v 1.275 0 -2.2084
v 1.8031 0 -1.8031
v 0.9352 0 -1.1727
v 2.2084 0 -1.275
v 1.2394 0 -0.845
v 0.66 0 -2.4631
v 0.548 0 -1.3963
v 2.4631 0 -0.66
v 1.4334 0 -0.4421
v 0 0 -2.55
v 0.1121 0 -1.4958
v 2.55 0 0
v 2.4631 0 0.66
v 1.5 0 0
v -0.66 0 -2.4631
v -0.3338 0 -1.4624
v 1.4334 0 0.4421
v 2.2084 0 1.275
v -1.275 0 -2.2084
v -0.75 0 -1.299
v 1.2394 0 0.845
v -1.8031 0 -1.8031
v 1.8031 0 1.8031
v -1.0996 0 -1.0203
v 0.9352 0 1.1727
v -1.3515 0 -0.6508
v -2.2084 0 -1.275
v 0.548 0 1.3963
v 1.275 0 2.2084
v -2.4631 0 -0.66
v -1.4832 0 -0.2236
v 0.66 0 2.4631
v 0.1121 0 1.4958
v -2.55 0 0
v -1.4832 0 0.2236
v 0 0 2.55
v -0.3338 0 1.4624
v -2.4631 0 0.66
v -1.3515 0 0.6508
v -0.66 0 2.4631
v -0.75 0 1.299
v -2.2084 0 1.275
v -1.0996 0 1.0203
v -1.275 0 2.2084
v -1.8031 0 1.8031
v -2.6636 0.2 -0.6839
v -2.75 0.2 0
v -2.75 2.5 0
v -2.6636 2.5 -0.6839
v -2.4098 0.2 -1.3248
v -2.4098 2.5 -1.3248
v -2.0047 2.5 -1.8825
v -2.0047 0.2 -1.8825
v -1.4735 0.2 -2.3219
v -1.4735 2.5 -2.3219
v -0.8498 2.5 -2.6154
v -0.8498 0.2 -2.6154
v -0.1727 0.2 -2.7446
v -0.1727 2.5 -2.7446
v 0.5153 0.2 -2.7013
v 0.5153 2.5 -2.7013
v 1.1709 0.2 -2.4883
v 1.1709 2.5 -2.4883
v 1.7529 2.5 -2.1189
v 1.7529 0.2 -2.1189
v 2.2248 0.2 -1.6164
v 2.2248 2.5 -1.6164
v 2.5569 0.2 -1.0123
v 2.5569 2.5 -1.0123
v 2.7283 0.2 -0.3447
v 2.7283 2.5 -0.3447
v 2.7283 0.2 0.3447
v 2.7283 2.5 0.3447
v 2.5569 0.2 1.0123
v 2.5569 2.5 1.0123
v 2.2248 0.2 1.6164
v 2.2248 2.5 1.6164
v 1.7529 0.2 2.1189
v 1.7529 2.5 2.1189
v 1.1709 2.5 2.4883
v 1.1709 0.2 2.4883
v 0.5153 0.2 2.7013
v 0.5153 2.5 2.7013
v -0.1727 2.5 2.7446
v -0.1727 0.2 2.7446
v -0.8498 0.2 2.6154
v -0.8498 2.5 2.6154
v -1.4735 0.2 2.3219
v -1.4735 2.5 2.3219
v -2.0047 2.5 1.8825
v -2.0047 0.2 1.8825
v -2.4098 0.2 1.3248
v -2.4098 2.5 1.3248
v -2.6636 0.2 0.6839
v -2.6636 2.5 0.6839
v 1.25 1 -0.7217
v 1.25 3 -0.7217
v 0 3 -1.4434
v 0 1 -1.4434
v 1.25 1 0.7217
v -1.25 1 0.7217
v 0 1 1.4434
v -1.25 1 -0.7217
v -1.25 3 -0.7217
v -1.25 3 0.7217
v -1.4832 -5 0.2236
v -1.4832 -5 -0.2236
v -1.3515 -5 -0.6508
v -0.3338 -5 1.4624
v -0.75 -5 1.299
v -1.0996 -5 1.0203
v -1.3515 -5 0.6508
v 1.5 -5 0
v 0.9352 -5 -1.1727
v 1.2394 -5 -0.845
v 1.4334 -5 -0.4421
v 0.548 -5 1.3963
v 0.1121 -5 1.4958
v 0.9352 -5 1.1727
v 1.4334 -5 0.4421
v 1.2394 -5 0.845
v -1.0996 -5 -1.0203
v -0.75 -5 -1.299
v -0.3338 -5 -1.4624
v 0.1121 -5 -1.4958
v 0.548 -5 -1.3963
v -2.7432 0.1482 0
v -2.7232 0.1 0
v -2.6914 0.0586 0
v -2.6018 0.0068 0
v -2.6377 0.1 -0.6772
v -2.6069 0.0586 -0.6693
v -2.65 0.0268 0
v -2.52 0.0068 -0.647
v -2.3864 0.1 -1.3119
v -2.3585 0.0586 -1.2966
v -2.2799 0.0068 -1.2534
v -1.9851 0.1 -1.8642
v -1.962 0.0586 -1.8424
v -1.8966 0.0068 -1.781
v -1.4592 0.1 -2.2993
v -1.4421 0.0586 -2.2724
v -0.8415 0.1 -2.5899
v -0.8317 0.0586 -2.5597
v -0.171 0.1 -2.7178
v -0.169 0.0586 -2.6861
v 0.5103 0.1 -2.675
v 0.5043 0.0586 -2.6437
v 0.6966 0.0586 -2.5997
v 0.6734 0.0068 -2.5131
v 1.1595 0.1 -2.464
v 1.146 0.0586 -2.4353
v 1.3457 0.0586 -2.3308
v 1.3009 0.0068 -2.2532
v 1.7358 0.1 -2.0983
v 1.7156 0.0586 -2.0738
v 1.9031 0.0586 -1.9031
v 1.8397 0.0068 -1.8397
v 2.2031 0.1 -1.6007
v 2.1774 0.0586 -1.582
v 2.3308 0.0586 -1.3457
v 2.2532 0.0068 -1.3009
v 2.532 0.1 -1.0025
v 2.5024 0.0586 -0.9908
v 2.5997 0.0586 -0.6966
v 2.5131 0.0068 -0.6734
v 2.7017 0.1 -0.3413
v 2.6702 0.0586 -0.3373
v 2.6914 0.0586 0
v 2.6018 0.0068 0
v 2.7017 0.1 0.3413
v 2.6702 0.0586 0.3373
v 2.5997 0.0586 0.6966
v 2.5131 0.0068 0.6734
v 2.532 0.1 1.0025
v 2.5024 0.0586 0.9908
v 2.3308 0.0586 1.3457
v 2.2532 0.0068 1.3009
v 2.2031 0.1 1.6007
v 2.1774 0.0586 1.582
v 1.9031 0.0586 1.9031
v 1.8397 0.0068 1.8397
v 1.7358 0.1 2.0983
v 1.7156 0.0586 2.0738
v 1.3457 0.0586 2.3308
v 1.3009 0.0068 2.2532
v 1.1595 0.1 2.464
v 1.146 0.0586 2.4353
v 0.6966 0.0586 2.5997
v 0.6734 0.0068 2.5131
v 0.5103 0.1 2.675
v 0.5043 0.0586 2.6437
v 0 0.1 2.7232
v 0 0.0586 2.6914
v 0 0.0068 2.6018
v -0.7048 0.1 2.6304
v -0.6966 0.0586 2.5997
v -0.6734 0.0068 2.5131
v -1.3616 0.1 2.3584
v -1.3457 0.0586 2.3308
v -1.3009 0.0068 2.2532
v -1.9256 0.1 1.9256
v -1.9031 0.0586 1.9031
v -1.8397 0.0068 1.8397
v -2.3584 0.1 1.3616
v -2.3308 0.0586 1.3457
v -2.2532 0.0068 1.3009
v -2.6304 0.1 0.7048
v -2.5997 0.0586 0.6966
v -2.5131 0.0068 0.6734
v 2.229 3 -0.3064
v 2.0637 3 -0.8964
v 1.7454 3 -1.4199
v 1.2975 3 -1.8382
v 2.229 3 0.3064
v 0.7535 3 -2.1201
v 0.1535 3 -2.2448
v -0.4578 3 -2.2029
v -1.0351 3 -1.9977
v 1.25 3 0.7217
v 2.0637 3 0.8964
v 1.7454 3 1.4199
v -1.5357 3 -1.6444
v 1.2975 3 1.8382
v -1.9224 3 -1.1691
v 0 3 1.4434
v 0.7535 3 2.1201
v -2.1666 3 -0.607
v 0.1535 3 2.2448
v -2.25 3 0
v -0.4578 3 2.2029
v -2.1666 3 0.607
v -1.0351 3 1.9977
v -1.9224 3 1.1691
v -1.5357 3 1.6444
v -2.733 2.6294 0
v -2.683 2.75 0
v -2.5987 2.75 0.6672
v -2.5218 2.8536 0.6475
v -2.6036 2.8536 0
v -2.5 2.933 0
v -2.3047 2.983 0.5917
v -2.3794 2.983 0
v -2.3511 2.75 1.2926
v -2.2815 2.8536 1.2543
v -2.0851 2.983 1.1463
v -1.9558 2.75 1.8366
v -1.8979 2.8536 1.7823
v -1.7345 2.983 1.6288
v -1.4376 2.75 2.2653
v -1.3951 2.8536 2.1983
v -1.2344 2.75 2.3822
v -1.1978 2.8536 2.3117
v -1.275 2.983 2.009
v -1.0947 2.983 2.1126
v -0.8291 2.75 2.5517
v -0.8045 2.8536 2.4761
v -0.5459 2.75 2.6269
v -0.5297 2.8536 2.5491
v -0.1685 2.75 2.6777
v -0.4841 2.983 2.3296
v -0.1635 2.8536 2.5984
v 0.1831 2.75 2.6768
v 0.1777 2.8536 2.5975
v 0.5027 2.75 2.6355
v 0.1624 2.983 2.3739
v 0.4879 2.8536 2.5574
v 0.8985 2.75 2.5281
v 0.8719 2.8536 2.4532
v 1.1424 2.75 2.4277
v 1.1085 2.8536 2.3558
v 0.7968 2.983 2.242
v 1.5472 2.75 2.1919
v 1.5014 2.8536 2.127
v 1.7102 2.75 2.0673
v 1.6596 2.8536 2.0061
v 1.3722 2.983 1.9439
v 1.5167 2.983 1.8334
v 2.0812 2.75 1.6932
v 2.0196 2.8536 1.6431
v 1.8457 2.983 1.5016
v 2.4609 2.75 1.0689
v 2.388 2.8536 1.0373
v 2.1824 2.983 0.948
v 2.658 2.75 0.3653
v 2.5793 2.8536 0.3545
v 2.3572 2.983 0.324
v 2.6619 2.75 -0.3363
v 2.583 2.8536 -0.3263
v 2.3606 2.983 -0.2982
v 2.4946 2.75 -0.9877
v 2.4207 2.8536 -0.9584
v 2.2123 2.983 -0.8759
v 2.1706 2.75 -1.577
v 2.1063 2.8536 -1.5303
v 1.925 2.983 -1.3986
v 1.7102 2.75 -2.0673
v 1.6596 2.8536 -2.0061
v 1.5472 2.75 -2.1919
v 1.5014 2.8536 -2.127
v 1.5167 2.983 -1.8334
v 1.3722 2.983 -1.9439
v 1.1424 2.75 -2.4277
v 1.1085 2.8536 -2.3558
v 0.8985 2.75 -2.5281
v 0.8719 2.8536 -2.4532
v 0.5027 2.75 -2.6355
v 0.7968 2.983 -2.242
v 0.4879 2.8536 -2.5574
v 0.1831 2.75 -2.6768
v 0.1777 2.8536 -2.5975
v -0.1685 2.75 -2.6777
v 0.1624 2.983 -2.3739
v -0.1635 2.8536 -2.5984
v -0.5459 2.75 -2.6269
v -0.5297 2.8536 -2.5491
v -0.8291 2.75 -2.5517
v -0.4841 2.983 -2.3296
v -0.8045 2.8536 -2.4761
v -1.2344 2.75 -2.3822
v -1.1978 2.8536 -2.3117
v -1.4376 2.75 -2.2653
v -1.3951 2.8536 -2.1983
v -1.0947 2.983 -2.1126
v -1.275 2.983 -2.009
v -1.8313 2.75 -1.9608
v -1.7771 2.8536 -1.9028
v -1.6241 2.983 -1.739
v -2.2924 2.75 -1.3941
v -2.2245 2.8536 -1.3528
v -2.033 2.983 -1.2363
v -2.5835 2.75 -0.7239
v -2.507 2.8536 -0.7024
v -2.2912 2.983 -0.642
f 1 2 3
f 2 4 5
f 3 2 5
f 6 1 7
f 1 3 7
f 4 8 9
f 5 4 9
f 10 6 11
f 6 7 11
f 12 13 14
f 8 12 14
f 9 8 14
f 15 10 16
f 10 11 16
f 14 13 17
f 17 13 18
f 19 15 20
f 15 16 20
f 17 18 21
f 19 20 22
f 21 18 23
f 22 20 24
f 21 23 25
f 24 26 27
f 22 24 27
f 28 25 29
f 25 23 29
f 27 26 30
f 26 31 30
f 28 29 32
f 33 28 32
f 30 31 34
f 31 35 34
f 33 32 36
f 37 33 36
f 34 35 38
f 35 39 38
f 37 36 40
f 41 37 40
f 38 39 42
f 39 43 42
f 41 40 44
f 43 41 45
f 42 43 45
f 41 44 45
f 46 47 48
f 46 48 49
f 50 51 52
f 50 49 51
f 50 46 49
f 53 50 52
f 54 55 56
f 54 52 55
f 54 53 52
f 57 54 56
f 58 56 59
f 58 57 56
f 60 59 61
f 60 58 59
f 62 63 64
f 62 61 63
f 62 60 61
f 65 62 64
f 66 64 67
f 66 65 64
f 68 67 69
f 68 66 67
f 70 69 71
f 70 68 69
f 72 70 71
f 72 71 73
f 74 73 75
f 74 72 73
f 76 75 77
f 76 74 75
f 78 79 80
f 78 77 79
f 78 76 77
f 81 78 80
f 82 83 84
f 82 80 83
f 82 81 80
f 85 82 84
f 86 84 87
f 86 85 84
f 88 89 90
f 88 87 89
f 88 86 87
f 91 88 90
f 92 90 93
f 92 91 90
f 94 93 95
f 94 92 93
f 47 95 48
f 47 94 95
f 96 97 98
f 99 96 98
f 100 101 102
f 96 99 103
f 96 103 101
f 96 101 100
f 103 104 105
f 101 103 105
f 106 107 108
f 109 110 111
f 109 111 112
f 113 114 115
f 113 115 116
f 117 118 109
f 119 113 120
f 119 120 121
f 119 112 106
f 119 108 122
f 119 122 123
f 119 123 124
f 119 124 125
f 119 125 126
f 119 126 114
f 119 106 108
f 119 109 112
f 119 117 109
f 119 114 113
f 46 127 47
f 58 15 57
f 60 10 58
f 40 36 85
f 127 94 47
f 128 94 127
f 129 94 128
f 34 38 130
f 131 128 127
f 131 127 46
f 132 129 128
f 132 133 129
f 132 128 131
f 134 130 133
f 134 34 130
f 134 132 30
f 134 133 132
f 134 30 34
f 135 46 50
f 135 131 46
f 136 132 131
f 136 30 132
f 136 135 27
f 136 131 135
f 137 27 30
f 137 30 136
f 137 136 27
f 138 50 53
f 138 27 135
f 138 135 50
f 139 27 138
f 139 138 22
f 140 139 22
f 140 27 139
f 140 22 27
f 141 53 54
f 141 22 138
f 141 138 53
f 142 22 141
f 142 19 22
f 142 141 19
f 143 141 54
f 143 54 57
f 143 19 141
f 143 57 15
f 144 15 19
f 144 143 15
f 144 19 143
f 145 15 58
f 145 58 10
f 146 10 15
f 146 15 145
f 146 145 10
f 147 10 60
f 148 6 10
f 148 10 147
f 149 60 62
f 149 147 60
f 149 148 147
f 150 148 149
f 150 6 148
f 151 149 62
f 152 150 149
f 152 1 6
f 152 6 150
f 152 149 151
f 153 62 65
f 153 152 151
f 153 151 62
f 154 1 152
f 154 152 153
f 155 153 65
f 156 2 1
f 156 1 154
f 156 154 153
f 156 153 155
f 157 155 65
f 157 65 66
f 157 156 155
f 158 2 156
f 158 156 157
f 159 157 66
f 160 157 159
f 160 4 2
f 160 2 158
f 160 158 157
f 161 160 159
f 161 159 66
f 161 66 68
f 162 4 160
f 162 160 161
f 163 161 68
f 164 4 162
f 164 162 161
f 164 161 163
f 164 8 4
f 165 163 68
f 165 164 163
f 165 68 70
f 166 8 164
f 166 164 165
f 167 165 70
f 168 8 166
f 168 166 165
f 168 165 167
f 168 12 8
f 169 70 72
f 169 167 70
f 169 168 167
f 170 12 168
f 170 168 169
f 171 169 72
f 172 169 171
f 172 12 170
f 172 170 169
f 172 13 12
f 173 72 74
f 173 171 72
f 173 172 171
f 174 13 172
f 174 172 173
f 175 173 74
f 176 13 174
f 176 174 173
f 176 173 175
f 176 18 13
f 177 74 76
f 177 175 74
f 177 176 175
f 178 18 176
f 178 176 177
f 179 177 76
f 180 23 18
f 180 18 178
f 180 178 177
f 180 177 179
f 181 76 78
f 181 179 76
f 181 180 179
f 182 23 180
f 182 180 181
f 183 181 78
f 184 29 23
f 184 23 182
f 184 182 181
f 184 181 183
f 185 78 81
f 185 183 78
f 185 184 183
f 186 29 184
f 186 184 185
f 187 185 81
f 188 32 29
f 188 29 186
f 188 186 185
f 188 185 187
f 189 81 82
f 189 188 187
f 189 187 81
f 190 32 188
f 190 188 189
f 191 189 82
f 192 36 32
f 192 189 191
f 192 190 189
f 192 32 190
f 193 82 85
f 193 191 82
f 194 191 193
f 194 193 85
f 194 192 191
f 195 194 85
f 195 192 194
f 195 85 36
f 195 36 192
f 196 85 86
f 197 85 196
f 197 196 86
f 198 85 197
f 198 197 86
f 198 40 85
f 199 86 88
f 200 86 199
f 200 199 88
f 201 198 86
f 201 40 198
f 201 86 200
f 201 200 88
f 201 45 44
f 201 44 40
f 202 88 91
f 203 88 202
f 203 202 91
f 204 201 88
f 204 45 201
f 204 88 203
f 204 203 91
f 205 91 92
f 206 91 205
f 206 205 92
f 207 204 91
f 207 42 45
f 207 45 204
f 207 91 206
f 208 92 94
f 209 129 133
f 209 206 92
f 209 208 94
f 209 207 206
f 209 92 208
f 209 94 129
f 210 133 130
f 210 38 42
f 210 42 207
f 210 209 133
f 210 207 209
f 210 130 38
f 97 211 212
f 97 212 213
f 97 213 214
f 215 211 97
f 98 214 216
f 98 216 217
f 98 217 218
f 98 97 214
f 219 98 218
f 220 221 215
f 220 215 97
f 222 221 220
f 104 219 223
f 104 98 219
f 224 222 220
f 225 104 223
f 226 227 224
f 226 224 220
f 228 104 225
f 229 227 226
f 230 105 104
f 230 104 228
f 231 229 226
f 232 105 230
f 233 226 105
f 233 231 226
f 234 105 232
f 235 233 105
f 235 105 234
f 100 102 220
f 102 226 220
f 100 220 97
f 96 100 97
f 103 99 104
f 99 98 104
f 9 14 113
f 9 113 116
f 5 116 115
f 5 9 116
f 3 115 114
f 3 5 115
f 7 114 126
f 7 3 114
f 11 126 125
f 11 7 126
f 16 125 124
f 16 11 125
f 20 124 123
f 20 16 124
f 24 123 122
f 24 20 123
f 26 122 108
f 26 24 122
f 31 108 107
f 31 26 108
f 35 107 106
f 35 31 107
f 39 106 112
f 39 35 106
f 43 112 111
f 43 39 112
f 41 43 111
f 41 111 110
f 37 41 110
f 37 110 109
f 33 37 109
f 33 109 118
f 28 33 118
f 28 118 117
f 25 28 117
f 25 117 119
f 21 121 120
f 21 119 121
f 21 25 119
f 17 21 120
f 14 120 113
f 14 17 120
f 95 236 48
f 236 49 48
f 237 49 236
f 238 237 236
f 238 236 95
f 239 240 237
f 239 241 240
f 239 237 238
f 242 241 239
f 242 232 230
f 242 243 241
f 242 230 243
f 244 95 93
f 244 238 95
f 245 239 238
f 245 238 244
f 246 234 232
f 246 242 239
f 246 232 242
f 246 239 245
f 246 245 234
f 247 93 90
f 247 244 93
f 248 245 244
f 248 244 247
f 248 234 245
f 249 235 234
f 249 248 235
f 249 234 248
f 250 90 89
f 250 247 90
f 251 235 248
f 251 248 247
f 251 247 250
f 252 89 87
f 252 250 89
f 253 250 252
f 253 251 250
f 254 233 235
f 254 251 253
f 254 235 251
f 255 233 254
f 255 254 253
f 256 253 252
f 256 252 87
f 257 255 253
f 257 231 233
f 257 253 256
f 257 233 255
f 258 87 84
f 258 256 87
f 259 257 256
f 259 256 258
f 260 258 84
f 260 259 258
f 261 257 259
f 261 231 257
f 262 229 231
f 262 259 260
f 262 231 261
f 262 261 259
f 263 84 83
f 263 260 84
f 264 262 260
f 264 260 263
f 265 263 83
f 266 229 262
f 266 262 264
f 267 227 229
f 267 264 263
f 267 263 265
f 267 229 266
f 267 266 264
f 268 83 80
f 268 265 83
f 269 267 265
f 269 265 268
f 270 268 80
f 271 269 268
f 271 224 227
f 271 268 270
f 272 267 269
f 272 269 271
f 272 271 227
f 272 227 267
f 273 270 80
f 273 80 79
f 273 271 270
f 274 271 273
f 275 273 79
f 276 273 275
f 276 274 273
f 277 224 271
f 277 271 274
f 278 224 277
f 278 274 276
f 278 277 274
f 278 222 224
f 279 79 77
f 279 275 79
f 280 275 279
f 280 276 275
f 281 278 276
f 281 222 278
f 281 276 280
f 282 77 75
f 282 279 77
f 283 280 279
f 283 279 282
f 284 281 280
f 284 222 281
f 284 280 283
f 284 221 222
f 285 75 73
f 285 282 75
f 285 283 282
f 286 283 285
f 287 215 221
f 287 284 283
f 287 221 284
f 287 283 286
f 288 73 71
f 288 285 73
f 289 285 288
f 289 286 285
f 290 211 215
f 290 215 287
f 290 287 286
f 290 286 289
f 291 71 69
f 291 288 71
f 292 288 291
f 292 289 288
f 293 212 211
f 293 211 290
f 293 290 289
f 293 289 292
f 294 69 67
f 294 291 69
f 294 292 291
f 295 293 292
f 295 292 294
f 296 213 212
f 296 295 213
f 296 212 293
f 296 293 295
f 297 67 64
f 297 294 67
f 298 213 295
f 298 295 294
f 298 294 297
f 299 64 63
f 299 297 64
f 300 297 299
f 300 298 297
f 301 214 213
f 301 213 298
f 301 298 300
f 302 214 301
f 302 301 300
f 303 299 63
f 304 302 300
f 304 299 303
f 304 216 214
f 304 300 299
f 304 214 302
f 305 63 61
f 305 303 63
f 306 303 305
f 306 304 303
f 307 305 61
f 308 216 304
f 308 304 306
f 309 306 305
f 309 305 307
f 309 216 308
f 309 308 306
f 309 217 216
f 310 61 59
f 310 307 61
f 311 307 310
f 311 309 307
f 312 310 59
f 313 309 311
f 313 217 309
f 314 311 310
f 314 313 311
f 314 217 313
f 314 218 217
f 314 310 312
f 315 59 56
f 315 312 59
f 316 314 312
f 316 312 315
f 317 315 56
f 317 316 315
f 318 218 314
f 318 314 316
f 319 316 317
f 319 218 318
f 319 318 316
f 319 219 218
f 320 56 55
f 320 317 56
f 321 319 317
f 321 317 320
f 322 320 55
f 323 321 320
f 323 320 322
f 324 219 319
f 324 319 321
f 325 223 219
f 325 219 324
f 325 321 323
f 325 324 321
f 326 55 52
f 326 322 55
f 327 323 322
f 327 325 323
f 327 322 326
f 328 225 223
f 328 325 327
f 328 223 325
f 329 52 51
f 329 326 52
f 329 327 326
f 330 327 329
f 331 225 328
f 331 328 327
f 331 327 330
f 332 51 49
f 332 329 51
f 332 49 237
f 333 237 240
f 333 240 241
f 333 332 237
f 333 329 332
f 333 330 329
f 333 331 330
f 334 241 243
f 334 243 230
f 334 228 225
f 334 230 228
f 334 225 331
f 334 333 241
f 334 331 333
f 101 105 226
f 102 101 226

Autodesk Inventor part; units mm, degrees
ref_plane "YZ Plane" through (0, 0, 0) normal (1, 0, 0) x (0, 1, 0)
ref_plane "XZ Plane" through (0, 0, 0) normal (0, 1, 0) x (-1, 0, 0)
ref_plane "XY Plane" through (0, 0, 0) normal (0, 0, 1) x (1, 0, 0)
sketch "スケッチ1" plane through (0, 0, 0) normal (0, 1, 0) x (-1, 0, 0)
  circle A0 centre (0, 0) radius 2.75
  dimension "d0" = 5.5
extrude "押し出し1" add sketch "スケッチ1" along normal blind 3
sketch "スケッチ2" plane through (0, 0, 0) normal (0, -1, 0) x (1, 0, 0)
  circle A0 centre (0, 0) radius 1.5
  dimension "d3" = 3
extrude "押し出し2" add sketch "スケッチ2" along normal blind 5
fillet "フィレット1" radius 0.5 1 edges at (2.75, 3, 0)
fillet "フィレット1" radius 0.2 1 edges at (2.75, 0, 0)
sketch "スケッチ3" plane through (0, 3, 0) normal (0, 1, 0) x (1, 0, 0)
  line L0 (0, 1.4434) -> (-1.25, 0.7217)
  line L1 (-1.25, 0.7217) -> (-1.25, -0.7217)
  line L2 (-1.25, -0.7217) -> (0, -1.4434)
  line L3 (0, -1.4434) -> (1.25, -0.7217)
  line L4 (1.25, -0.7217) -> (1.25, 0.7217)
  line L5 (1.25, 0.7217) -> (0, 1.4434)
  line L6 (0, 1.4434) -> (0, -1.4434) construction
  circle A0 centre (0, 0) radius 1.4434 construction
  dimension "d12" = 2.5
extrude "押し出し3" cut sketch "スケッチ3" against normal blind 2
thread "ねじ1" size "M3x0.5" class "6g" standard "ANSI Metric M Profile" full length
properties part number "M3-CapScrew"
